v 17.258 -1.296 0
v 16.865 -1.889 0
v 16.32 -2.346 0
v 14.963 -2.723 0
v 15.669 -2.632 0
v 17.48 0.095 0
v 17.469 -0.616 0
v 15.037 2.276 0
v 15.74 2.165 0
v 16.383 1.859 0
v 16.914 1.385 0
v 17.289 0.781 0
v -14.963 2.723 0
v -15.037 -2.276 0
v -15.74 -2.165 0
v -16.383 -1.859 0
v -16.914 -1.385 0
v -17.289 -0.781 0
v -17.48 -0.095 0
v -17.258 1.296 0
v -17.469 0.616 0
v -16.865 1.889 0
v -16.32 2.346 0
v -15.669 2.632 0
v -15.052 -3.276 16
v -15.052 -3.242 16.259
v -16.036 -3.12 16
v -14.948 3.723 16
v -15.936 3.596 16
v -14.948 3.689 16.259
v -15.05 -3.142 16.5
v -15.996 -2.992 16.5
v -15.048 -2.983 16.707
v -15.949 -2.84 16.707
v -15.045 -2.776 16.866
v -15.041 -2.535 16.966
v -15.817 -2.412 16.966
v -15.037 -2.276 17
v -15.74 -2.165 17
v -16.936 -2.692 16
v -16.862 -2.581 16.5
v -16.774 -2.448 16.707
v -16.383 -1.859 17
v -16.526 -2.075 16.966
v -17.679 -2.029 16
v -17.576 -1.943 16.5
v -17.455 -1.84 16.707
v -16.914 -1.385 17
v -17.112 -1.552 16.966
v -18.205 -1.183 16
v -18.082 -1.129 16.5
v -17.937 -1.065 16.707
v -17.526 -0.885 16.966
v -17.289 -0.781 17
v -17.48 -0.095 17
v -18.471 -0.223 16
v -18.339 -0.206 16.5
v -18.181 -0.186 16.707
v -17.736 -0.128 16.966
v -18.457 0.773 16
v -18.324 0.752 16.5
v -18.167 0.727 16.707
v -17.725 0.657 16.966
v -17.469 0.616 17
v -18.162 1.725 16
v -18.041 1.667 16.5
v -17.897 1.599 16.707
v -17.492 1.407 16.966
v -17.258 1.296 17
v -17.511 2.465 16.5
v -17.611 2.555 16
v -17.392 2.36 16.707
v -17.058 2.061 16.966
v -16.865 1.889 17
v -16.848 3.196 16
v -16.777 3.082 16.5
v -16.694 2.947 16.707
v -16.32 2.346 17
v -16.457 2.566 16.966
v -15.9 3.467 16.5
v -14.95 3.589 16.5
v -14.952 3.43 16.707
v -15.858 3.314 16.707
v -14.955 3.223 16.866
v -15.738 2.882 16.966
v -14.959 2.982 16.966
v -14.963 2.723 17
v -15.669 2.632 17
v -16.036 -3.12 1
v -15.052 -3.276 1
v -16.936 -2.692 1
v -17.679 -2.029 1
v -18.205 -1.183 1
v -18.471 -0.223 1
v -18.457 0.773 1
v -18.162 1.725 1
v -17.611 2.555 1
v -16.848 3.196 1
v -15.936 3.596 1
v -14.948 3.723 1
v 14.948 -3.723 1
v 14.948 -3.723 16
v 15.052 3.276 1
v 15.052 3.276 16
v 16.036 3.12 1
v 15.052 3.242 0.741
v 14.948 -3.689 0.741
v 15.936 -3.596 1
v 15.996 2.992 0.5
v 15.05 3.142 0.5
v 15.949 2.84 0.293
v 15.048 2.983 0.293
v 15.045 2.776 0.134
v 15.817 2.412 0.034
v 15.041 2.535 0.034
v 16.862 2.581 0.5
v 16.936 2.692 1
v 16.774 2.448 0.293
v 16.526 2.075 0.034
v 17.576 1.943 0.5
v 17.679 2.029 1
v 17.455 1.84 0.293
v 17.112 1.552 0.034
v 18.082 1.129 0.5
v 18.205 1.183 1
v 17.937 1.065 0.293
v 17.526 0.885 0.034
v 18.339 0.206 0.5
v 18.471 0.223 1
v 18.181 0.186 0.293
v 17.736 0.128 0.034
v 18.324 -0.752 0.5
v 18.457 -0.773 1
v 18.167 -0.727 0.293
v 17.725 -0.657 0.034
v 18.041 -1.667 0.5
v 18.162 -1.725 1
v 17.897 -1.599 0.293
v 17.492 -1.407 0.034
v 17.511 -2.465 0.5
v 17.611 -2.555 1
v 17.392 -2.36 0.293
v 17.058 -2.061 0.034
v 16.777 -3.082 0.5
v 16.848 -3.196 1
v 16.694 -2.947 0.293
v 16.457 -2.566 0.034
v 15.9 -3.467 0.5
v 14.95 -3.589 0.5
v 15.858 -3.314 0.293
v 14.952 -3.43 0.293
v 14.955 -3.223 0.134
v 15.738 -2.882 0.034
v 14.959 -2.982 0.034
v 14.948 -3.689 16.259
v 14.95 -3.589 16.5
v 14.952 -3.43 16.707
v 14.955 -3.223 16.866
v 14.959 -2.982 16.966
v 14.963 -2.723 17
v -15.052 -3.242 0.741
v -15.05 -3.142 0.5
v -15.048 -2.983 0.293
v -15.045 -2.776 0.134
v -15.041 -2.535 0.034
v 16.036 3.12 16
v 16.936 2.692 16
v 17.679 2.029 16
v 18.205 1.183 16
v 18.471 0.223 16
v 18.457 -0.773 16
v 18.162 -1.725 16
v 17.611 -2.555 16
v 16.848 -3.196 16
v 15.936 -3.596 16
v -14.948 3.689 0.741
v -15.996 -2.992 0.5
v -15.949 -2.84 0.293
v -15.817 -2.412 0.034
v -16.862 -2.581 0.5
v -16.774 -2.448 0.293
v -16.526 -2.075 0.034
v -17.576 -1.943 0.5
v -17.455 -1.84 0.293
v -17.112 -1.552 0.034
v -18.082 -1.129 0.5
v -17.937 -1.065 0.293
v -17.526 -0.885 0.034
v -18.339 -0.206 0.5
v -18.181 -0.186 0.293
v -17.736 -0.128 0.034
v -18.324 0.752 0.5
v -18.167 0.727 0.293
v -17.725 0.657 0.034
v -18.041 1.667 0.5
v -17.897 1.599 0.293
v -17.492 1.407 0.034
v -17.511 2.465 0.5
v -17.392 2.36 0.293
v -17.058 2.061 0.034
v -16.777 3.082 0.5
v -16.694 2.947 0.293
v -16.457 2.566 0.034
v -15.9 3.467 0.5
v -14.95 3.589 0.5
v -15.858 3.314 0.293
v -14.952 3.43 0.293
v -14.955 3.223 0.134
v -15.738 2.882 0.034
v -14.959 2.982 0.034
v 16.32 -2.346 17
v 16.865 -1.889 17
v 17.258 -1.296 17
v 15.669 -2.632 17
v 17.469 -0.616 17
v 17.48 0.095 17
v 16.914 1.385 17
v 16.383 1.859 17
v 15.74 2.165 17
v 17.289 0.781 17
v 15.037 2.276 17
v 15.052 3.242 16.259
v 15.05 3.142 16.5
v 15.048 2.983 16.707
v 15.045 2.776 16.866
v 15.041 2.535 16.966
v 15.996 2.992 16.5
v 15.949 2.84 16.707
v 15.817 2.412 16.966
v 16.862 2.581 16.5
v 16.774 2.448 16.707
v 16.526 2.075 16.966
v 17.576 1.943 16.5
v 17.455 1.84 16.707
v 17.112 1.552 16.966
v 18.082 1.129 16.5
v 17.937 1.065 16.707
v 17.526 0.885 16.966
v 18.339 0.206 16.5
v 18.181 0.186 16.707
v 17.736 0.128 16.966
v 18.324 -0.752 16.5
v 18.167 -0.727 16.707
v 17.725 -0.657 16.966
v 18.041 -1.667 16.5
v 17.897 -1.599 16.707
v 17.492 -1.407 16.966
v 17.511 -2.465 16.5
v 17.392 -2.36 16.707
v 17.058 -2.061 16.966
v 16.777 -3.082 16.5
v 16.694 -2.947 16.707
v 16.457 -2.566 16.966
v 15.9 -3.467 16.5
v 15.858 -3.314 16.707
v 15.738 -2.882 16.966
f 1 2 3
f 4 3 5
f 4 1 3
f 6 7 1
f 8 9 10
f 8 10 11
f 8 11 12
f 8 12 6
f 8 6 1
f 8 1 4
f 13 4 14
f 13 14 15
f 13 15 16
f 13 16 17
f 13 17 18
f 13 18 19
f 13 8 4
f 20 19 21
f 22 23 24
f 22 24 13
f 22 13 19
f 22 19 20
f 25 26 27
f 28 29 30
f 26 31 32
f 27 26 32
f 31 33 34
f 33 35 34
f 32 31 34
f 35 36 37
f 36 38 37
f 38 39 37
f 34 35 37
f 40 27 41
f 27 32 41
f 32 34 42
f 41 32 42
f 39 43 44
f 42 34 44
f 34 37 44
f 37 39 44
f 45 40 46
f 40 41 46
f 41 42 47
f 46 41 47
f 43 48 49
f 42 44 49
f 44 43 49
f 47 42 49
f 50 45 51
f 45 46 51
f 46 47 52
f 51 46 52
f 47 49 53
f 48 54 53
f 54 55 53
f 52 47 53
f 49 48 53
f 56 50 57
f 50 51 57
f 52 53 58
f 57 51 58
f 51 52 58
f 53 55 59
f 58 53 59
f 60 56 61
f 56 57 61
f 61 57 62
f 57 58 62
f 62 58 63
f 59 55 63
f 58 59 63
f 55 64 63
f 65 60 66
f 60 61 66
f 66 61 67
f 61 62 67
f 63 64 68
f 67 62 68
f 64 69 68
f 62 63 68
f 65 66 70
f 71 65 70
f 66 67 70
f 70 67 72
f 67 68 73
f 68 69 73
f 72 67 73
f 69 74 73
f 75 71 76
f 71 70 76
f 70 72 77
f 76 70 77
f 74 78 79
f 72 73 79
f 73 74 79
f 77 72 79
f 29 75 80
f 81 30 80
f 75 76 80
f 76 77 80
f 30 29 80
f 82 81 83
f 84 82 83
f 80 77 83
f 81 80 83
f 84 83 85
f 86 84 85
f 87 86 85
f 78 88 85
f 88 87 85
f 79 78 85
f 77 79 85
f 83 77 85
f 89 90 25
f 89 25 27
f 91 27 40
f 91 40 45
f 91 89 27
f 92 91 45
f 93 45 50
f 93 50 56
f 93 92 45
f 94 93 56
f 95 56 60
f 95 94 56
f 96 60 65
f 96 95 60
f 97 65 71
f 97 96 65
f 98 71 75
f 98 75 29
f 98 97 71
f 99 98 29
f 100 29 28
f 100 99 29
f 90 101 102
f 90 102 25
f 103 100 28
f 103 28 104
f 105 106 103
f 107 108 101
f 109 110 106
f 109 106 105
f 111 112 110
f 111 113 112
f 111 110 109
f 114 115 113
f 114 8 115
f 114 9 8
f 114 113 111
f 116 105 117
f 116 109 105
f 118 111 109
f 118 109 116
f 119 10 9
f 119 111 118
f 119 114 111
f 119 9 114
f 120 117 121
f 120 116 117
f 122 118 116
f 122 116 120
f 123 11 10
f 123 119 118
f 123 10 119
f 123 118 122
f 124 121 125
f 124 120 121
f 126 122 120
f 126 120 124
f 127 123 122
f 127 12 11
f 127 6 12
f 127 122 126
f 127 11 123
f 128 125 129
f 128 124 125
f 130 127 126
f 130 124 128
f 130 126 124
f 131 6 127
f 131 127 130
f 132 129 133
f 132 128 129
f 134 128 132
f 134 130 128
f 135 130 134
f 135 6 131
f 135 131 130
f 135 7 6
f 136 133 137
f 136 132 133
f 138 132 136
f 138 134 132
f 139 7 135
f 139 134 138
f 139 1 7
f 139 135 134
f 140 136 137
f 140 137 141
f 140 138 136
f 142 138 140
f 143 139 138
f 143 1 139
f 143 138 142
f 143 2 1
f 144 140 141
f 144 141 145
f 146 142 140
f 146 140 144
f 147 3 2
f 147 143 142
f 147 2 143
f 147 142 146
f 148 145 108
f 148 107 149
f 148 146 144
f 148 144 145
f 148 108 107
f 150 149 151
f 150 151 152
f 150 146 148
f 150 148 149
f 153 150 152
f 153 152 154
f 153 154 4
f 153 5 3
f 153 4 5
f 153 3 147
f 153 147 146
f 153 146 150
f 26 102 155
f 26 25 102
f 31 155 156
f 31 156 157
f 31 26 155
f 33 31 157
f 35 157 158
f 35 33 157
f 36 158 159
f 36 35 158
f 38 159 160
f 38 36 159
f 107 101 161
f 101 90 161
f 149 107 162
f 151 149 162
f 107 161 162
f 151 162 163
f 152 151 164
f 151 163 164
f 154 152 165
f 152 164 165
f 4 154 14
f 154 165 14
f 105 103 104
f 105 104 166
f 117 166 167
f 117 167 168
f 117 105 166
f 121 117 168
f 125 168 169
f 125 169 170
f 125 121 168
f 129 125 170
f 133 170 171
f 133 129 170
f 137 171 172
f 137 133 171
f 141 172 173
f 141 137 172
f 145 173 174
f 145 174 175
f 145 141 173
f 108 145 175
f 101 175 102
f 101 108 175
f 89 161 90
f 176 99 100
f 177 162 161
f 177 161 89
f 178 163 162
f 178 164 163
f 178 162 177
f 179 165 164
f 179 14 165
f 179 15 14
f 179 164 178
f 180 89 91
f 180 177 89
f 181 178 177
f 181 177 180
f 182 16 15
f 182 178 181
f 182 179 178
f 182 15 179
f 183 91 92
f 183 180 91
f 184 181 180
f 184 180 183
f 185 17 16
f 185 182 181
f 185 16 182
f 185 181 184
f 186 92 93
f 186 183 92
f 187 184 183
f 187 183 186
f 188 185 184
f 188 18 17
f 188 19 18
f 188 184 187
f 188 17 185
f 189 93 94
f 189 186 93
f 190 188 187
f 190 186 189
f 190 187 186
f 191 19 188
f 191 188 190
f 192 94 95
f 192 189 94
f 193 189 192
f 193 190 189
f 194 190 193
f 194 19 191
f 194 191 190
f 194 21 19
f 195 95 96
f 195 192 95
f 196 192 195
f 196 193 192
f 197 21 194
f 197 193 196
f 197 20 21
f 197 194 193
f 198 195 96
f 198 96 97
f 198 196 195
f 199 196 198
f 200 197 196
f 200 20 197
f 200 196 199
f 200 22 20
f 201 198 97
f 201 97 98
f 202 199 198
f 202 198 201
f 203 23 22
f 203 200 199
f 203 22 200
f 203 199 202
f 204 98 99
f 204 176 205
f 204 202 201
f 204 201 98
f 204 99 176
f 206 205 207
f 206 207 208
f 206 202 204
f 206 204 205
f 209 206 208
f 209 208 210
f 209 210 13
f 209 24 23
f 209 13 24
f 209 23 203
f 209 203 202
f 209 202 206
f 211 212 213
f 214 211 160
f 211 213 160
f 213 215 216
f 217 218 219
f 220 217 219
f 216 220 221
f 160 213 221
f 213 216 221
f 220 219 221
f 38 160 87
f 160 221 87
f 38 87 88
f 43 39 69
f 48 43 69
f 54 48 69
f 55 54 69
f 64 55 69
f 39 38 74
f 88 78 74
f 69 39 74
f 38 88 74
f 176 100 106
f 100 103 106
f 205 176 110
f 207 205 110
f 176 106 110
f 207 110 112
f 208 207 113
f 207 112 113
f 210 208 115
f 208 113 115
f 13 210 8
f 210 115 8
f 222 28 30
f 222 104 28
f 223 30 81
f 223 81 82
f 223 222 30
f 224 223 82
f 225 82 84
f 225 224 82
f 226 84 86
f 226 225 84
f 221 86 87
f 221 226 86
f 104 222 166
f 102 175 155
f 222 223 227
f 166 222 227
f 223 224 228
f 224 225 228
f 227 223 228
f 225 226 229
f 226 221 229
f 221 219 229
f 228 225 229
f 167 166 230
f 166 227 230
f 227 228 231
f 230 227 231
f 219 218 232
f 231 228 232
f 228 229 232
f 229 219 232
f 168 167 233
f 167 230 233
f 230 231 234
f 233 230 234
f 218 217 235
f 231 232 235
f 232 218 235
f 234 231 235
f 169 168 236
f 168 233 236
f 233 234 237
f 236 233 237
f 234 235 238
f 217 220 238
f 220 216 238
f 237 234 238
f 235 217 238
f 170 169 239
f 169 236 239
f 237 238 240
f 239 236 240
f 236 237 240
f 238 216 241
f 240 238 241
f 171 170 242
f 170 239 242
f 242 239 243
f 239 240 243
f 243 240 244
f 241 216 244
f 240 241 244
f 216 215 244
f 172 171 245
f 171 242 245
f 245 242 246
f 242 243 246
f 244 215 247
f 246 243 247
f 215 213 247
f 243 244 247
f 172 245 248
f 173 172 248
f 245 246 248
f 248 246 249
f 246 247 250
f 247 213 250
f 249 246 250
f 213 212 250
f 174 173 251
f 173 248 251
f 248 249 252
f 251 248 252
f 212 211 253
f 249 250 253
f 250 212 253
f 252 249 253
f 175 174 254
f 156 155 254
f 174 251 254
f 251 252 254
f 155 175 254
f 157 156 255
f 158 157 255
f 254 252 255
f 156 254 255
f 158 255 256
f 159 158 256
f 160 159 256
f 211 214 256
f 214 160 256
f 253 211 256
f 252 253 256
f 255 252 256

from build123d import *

# Parameters (mm, degrees)
RESSALTO_EXTRUS_O1_DEPTH = 17
FILETE1_R                = 1


with BuildPart() as part:
    # Esboço1 → Ressalto-extrusão1 (new body)
    with BuildSketch(Plane.XY):
        with BuildLine():
            Line((-14.947871578, 3.723044087), (15.052128422, 3.276179478))
            ThreePointArc((15.052128422, 3.276179478), (18.499611782, -0.275560726), (14.947871578, -3.723044087))
            Line((14.947871578, -3.723044087), (-15.052128422, -3.276179478))
            ThreePointArc((-15.052128422, -3.276179478), (-18.499611782, 0.275560726), (-14.947871578, 3.723044087))
        make_face()
    extrude(amount=RESSALTO_EXTRUS_O1_DEPTH)

    # Filete1
    filete1_edges = [part.edges().sort_by_distance(p)[0] for p in [
        (18.499611782, -0.275560726, 17),
        (0.052128422, 3.499611782, 17),
        (-18.499611782, 0.275560726, 17),
        (0.052128422, 3.499611782, 0),
        (18.499611782, -0.275560726, 0),
        (-0.052128422, -3.499611782, 0),
        (-18.499611782, 0.275560726, 0),
        (-0.052128422, -3.499611782, 17),
    ]]
    fillet(filete1_edges, radius=FILETE1_R)


solid = part.part
